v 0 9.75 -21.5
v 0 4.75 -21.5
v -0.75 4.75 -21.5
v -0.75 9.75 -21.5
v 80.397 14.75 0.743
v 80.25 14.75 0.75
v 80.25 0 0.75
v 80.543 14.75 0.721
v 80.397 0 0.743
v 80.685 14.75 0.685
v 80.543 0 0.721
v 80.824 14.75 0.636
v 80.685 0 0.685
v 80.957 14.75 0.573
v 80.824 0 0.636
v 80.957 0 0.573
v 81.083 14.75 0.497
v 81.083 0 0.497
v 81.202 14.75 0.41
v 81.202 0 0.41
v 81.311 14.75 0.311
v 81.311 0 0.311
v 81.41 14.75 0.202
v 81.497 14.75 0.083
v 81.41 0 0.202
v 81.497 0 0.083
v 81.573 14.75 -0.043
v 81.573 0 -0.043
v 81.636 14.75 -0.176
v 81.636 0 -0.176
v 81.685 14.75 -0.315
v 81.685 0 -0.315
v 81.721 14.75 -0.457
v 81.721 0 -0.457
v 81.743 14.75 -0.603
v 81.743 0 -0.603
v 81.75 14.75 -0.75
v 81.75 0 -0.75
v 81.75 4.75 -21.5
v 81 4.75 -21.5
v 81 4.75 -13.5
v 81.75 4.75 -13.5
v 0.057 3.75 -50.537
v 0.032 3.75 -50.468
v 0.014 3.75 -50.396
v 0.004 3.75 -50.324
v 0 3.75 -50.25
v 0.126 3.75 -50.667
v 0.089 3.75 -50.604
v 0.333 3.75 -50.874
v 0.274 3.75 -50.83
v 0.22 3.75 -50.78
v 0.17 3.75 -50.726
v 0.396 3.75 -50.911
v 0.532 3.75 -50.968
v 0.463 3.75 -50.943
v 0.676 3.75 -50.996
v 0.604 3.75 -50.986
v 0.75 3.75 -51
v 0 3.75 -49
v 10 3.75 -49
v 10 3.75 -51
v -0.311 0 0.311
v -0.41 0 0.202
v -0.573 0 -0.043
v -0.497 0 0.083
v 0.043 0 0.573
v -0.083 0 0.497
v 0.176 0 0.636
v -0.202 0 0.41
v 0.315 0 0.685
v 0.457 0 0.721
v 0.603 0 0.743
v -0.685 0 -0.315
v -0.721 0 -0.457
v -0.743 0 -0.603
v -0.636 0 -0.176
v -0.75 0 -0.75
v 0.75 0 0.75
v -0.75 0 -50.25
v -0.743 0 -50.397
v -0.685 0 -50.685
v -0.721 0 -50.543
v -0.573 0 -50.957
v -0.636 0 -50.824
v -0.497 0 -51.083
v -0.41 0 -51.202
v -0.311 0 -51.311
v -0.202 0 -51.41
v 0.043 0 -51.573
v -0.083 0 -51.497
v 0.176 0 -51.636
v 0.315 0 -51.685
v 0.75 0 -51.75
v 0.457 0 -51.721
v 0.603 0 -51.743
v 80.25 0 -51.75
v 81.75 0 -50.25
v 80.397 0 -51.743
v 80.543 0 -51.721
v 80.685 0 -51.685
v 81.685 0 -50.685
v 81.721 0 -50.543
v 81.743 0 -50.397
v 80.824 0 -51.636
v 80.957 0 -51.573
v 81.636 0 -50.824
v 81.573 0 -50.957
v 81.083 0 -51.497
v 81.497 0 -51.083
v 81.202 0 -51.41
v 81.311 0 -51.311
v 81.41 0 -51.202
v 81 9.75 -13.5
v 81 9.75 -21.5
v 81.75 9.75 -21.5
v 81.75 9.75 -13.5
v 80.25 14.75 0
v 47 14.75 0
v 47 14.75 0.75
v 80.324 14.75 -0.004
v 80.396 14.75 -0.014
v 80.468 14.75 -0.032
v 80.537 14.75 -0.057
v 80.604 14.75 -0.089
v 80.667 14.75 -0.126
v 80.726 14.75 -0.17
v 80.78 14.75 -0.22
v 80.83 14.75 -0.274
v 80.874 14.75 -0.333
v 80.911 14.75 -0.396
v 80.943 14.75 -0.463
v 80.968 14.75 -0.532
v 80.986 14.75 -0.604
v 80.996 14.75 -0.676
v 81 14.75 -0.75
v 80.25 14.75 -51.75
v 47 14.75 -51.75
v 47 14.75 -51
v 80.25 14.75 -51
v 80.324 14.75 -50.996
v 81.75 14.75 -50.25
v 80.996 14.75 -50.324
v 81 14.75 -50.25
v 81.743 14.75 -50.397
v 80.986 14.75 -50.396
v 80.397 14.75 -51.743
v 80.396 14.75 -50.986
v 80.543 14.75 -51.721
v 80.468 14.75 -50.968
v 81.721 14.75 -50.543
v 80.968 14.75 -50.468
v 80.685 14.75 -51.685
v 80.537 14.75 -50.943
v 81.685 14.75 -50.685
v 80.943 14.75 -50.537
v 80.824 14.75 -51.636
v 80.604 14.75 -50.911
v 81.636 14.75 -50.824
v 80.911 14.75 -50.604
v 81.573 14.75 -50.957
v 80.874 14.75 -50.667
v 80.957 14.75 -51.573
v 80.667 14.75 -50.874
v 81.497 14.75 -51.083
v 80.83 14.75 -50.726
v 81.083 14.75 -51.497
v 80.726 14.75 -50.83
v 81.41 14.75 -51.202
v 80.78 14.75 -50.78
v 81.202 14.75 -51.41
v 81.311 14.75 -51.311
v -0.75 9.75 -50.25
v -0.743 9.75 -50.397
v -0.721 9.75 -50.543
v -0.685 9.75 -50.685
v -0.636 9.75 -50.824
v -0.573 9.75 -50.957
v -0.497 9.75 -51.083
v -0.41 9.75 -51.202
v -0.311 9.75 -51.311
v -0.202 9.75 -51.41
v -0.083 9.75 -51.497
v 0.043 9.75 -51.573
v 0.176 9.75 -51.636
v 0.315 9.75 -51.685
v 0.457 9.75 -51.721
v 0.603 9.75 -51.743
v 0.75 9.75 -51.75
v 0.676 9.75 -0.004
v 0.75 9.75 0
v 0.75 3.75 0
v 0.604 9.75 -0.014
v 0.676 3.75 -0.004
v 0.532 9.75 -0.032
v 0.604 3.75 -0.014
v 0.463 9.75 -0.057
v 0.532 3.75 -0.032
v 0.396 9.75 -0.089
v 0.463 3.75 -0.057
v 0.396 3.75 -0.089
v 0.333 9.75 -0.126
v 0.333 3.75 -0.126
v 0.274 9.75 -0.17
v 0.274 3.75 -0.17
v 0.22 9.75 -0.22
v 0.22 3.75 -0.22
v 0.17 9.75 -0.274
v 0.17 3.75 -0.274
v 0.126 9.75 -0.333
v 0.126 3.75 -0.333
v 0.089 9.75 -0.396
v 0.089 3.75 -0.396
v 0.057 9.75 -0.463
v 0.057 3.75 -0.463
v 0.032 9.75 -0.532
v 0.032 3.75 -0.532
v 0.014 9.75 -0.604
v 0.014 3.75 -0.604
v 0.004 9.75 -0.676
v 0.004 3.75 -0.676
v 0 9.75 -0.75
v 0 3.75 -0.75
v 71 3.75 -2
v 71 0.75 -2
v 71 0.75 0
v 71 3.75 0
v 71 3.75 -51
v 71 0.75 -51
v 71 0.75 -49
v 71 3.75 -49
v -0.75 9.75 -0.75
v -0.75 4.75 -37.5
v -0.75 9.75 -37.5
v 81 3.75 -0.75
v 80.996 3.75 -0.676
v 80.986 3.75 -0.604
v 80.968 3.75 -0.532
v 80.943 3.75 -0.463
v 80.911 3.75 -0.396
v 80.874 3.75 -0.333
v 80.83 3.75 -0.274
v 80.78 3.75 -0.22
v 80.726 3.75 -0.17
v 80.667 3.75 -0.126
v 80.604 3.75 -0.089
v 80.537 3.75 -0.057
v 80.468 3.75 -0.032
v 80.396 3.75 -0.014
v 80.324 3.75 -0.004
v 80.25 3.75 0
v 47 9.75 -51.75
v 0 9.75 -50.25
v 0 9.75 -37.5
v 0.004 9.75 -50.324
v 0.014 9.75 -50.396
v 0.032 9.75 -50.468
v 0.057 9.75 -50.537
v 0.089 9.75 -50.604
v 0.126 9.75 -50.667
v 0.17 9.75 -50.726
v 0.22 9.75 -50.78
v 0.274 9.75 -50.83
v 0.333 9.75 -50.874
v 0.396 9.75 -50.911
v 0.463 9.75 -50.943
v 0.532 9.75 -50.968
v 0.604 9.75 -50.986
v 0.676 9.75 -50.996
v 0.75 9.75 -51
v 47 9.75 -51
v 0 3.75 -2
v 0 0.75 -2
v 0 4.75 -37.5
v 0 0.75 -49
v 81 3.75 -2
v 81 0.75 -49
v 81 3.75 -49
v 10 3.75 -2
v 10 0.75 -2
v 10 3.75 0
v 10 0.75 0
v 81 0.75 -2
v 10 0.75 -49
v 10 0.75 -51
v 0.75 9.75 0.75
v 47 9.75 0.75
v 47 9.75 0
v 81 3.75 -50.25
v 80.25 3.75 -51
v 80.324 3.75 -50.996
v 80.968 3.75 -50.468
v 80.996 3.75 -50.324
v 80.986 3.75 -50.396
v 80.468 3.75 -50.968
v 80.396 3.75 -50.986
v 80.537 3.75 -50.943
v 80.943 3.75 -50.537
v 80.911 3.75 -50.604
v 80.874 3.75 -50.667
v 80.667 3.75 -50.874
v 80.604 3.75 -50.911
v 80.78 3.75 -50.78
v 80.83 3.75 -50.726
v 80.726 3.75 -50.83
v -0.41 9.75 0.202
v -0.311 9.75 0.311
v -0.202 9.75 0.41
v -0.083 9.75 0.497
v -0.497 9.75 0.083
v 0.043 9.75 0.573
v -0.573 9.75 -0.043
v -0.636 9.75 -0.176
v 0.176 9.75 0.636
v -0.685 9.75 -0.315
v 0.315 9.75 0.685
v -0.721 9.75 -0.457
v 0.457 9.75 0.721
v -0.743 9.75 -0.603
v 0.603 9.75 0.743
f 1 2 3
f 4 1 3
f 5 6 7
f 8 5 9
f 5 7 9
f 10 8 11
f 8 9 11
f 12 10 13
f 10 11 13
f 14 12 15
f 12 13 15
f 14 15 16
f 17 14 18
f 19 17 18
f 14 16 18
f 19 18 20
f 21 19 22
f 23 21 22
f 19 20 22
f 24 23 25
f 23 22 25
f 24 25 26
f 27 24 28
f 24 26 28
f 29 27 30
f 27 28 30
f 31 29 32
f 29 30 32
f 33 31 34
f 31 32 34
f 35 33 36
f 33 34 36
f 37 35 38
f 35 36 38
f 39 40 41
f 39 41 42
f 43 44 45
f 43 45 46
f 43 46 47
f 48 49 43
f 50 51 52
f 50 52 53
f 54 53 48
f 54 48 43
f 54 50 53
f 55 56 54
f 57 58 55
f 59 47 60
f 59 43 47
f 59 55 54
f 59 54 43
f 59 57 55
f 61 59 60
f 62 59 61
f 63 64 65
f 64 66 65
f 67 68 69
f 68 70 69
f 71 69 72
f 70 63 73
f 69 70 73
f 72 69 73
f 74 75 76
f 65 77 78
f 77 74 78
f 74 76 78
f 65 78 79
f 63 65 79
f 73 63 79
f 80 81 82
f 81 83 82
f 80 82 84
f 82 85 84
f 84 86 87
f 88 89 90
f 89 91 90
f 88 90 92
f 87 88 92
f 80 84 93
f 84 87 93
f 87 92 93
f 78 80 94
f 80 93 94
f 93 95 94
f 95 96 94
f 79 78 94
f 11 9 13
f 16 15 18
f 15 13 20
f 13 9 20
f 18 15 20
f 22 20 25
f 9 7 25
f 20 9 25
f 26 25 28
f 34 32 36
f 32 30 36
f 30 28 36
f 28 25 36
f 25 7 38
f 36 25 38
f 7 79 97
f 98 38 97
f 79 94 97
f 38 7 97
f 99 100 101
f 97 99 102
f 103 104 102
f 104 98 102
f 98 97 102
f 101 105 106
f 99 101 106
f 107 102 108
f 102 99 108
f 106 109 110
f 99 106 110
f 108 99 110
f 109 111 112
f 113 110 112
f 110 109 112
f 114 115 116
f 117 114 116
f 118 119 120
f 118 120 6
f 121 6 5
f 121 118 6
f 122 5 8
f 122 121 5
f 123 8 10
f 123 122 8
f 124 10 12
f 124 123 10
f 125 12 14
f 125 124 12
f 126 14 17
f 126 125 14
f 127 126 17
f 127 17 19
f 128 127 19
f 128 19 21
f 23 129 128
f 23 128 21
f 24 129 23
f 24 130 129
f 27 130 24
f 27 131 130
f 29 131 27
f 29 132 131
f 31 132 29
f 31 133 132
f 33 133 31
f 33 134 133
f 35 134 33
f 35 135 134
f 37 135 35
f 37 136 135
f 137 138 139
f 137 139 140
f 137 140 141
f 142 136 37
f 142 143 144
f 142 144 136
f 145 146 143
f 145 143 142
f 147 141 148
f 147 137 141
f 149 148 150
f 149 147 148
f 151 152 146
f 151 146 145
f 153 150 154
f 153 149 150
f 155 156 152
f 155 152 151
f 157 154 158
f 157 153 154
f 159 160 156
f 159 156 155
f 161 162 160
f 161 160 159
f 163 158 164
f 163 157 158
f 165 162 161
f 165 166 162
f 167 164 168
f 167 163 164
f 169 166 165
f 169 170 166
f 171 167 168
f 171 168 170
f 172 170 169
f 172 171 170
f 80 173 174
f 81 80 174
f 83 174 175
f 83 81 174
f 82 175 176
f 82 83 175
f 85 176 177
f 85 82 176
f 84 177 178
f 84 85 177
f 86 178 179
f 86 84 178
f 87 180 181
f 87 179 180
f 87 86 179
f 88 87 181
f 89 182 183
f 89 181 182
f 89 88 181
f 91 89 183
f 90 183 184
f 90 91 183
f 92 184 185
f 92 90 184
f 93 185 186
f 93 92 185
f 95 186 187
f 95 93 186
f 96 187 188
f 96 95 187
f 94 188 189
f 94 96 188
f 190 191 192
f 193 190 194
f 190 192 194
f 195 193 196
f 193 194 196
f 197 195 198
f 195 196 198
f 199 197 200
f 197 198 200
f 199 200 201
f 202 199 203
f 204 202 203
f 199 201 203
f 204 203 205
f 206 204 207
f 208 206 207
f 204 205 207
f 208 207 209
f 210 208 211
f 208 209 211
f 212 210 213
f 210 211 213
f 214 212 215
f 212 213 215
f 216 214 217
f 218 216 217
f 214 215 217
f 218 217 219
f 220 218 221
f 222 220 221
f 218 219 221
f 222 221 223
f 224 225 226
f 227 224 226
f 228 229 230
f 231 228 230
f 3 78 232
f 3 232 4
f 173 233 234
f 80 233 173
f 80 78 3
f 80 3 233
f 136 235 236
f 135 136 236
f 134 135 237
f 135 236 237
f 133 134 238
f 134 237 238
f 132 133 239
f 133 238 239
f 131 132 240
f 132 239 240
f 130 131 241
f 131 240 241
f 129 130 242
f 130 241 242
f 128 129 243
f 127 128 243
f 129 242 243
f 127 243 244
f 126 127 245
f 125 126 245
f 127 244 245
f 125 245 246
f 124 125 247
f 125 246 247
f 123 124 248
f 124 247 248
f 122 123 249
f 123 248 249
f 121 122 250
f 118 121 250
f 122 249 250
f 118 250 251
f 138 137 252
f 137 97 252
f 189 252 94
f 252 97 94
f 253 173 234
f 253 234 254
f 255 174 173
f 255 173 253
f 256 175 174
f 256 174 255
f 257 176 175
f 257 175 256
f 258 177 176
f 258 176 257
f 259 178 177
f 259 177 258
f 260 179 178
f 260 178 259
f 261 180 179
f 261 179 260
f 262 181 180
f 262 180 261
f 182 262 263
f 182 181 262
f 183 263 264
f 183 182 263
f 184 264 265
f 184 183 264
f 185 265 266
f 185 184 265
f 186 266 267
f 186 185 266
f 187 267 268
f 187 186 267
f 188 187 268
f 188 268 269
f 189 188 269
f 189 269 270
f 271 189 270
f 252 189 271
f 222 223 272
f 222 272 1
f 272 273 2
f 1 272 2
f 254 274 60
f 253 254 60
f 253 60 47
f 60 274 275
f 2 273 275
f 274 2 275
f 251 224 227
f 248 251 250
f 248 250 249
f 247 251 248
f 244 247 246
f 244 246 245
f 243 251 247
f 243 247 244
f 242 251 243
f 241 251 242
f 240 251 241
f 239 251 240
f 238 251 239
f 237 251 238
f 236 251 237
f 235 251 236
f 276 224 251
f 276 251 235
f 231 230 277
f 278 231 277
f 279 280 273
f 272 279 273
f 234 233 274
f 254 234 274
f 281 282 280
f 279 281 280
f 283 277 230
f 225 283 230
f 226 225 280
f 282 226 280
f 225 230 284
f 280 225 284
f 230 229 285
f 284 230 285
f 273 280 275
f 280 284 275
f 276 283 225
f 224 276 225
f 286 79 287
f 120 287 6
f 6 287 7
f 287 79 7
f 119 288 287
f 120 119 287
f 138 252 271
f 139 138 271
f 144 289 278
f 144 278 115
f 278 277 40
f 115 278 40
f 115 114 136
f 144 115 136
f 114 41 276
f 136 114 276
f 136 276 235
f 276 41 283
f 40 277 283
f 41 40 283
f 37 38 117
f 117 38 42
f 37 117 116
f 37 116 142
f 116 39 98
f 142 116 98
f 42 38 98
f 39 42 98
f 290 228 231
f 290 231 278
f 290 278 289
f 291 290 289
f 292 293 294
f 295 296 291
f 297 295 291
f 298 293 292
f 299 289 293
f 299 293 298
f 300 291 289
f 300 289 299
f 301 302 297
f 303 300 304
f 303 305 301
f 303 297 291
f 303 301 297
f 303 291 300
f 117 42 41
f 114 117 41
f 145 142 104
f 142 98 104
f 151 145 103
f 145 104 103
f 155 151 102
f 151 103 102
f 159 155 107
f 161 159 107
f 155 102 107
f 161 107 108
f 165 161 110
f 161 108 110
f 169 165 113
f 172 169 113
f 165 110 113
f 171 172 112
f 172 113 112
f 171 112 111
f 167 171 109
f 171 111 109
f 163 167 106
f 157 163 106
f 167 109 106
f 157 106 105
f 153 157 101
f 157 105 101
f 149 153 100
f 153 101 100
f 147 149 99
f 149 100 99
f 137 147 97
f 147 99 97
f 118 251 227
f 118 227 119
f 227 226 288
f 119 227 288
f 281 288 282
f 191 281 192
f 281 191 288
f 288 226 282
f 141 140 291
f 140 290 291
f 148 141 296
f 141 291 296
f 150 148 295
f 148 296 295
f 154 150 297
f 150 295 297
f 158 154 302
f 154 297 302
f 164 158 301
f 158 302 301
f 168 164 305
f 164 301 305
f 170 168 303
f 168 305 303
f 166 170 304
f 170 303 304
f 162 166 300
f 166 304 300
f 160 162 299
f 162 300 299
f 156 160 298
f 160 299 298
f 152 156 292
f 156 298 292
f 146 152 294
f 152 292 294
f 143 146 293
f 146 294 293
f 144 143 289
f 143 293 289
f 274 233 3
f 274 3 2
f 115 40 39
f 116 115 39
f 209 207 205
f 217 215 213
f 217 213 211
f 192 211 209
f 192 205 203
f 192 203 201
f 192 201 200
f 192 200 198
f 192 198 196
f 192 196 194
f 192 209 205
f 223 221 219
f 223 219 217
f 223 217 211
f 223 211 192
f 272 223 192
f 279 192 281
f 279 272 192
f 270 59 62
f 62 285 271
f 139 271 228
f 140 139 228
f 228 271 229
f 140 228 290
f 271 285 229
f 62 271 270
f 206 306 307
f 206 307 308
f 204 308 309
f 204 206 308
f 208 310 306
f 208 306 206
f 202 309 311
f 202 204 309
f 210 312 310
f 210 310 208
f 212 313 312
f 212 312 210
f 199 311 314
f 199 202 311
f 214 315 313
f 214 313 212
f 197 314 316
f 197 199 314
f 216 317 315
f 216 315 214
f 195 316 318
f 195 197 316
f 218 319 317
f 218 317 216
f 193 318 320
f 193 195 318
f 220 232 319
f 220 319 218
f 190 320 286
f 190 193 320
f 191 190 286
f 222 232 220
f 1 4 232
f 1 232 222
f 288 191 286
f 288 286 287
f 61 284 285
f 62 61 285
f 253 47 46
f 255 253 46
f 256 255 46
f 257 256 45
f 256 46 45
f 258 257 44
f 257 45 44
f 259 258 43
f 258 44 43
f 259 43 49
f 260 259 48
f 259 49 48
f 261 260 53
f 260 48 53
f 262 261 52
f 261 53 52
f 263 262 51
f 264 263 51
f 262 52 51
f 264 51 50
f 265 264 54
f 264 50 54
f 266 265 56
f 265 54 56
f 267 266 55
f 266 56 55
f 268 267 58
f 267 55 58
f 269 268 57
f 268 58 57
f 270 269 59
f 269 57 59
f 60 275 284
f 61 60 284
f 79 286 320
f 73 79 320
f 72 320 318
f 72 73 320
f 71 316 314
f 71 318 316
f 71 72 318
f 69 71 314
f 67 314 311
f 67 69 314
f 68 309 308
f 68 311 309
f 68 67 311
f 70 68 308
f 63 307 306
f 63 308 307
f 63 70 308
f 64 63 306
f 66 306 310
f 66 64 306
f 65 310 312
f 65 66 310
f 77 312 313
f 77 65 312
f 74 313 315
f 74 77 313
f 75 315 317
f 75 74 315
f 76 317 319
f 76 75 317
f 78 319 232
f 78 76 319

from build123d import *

# Parameters (mm, degrees)
BOSS_EXTRUDE1_DEPTH = 0.75
BOSS_EXTRUDE2_DEPTH = 3.75
BOSS_EXTRUDE3_DEPTH = 9.75
SKETCH1_5_W         = 0.75
SKETCH1_5_H         = 16
SKETCH1_5_H_2       = 8
BOSS_EXTRUDE4_DEPTH = 4.75
BOSS_EXTRUDE5_START = 9.75
BOSS_EXTRUDE5_DEPTH = 5


with BuildPart() as part:
    # Sketch1 → Boss-Extrude1 (new body)
    with BuildSketch(Plane(origin=(0, 0, 0), x_dir=(1, 0, 0), z_dir=(0, 1, 0))):
        with BuildLine():
            Line((0.75, 51.75), (80.25, 51.75))
            ThreePointArc((80.25, 51.75), (81.310660172, 51.310660172), (81.75, 50.25))
            Line((81.75, 50.25), (81.75, 0.75))
            ThreePointArc((81.75, 0.75), (81.310660172, -0.310660172), (80.25, -0.75))
            Line((80.25, -0.75), (0.75, -0.75))
            ThreePointArc((0.75, -0.75), (-0.310660172, -0.310660172), (-0.75, 0.75))
            Line((-0.75, 0.75), (-0.75, 50.25))
            ThreePointArc((-0.75, 50.25), (-0.310660172, 51.310660172), (0.75, 51.75))
        make_face()
    extrude(amount=BOSS_EXTRUDE1_DEPTH)

    # Sketch1<3> → Boss-Extrude2 (add)
    with BuildSketch(Plane(origin=(0, 0, 0), x_dir=(1, 0, 0), z_dir=(0, 1, 0))):
        with BuildLine():
            Line((0, 50.25), (0, 49))
            Line((0, 49), (10, 49))
            Line((10, 49), (10, 51))
            Line((10, 51), (0.75, 51))
            ThreePointArc((0.75, 51), (0.219669914, 50.780330086), (0, 50.25))
        make_face()
        with BuildLine():
            Line((10, 2), (0, 2))
            Line((0, 2), (0, 0.75))
            ThreePointArc((0, 0.75), (0.219669914, 0.219669914), (0.75, 0))
            Line((0.75, 0), (10, 0))
            Line((10, 0), (10, 2))
        make_face()
        with BuildLine():
            Line((80.25, 51), (71, 51))
            Line((71, 51), (71, 49))
            Line((71, 49), (81, 49))
            Line((81, 49), (81, 50.25))
            ThreePointArc((81, 50.25), (80.780330086, 50.780330086), (80.25, 51))
        make_face()
        with BuildLine():
            Line((71, 2), (71, 0))
            Line((71, 0), (80.25, 0))
            ThreePointArc((80.25, 0), (80.780330086, 0.219669914), (81, 0.75))
            Line((81, 0.75), (81, 2))
            Line((81, 2), (71, 2))
        make_face()
    extrude(amount=BOSS_EXTRUDE2_DEPTH)

    # Sketch1<4> → Boss-Extrude3 (add)
    with BuildSketch(Plane(origin=(0, 0, 0), x_dir=(1, 0, 0), z_dir=(0, 1, 0))):
        with BuildLine():
            Line((0, 37.5), (0, 50.25))
            ThreePointArc((0, 50.25), (0.219669914, 50.780330086), (0.75, 51))
            Line((0.75, 51), (80.25, 51))
            ThreePointArc((80.25, 51), (80.780330086, 50.780330086), (81, 50.25))
            Line((81, 50.25), (81, 21.5))
            Line((81, 21.5), (81.75, 21.5))
            Line((81.75, 21.5), (81.75, 50.25))
            ThreePointArc((81.75, 50.25), (81.310660172, 51.310660172), (80.25, 51.75))
            Line((80.25, 51.75), (0.75, 51.75))
            ThreePointArc((0.75, 51.75), (-0.310660172, 51.310660172), (-0.75, 50.25))
            Line((-0.75, 50.25), (-0.75, 37.5))
            Line((-0.75, 37.5), (0, 37.5))
        make_face()
        with BuildLine():
            Line((0, 21.5), (-0.75, 21.5))
            Line((-0.75, 21.5), (-0.75, 0.75))
            ThreePointArc((-0.75, 0.75), (-0.310660172, -0.310660172), (0.75, -0.75))
            Line((0.75, -0.75), (80.25, -0.75))
            ThreePointArc((80.25, -0.75), (81.310660172, -0.310660172), (81.75, 0.75))
            Line((81.75, 0.75), (81.75, 13.5))
            Line((81.75, 13.5), (81, 13.5))
            Line((81, 13.5), (81, 0.75))
            ThreePointArc((81, 0.75), (80.780330086, 0.219669914), (80.25, 0))
            Line((80.25, 0), (0.75, 0))
            ThreePointArc((0.75, 0), (0.219669914, 0.219669914), (0, 0.75))
            Line((0, 0.75), (0, 21.5))
        make_face()
    extrude(amount=BOSS_EXTRUDE3_DEPTH)

    # Sketch1<5> → Boss-Extrude4 (add)
    with BuildSketch(Plane(origin=(0, 0, 0), x_dir=(1, 0, 0), z_dir=(0, 1, 0))):
        with Locations((-0.375, 29.5)):
            Rectangle(SKETCH1_5_W, SKETCH1_5_H)
        with Locations((81.375, 17.5)):
            Rectangle(SKETCH1_5_W, SKETCH1_5_H_2)
    extrude(amount=BOSS_EXTRUDE4_DEPTH)

    # Sketch1<8> → Boss-Extrude5 (add)
    with BuildSketch(Plane(origin=(0, 0, 0), x_dir=(1, 0, 0), z_dir=(0, 1, 0)).offset(BOSS_EXTRUDE5_START)):
        with BuildLine():
            Line((47, 51.75), (47, 51))
            Line((47, 51), (80.25, 51))
            ThreePointArc((80.25, 51), (80.780330086, 50.780330086), (81, 50.25))
            Line((81, 50.25), (81, 0.75))
            ThreePointArc((81, 0.75), (80.780330086, 0.219669914), (80.25, 0))
            Line((80.25, 0), (47, 0))
            Line((47, 0), (47, -0.75))
            Line((47, -0.75), (80.25, -0.75))
            ThreePointArc((80.25, -0.75), (81.310660172, -0.310660172), (81.75, 0.75))
            Line((81.75, 0.75), (81.75, 50.25))
            ThreePointArc((81.75, 50.25), (81.310660172, 51.310660172), (80.25, 51.75))
            Line((80.25, 51.75), (47, 51.75))
        make_face()
    extrude(amount=BOSS_EXTRUDE5_DEPTH)


solid = part.part
